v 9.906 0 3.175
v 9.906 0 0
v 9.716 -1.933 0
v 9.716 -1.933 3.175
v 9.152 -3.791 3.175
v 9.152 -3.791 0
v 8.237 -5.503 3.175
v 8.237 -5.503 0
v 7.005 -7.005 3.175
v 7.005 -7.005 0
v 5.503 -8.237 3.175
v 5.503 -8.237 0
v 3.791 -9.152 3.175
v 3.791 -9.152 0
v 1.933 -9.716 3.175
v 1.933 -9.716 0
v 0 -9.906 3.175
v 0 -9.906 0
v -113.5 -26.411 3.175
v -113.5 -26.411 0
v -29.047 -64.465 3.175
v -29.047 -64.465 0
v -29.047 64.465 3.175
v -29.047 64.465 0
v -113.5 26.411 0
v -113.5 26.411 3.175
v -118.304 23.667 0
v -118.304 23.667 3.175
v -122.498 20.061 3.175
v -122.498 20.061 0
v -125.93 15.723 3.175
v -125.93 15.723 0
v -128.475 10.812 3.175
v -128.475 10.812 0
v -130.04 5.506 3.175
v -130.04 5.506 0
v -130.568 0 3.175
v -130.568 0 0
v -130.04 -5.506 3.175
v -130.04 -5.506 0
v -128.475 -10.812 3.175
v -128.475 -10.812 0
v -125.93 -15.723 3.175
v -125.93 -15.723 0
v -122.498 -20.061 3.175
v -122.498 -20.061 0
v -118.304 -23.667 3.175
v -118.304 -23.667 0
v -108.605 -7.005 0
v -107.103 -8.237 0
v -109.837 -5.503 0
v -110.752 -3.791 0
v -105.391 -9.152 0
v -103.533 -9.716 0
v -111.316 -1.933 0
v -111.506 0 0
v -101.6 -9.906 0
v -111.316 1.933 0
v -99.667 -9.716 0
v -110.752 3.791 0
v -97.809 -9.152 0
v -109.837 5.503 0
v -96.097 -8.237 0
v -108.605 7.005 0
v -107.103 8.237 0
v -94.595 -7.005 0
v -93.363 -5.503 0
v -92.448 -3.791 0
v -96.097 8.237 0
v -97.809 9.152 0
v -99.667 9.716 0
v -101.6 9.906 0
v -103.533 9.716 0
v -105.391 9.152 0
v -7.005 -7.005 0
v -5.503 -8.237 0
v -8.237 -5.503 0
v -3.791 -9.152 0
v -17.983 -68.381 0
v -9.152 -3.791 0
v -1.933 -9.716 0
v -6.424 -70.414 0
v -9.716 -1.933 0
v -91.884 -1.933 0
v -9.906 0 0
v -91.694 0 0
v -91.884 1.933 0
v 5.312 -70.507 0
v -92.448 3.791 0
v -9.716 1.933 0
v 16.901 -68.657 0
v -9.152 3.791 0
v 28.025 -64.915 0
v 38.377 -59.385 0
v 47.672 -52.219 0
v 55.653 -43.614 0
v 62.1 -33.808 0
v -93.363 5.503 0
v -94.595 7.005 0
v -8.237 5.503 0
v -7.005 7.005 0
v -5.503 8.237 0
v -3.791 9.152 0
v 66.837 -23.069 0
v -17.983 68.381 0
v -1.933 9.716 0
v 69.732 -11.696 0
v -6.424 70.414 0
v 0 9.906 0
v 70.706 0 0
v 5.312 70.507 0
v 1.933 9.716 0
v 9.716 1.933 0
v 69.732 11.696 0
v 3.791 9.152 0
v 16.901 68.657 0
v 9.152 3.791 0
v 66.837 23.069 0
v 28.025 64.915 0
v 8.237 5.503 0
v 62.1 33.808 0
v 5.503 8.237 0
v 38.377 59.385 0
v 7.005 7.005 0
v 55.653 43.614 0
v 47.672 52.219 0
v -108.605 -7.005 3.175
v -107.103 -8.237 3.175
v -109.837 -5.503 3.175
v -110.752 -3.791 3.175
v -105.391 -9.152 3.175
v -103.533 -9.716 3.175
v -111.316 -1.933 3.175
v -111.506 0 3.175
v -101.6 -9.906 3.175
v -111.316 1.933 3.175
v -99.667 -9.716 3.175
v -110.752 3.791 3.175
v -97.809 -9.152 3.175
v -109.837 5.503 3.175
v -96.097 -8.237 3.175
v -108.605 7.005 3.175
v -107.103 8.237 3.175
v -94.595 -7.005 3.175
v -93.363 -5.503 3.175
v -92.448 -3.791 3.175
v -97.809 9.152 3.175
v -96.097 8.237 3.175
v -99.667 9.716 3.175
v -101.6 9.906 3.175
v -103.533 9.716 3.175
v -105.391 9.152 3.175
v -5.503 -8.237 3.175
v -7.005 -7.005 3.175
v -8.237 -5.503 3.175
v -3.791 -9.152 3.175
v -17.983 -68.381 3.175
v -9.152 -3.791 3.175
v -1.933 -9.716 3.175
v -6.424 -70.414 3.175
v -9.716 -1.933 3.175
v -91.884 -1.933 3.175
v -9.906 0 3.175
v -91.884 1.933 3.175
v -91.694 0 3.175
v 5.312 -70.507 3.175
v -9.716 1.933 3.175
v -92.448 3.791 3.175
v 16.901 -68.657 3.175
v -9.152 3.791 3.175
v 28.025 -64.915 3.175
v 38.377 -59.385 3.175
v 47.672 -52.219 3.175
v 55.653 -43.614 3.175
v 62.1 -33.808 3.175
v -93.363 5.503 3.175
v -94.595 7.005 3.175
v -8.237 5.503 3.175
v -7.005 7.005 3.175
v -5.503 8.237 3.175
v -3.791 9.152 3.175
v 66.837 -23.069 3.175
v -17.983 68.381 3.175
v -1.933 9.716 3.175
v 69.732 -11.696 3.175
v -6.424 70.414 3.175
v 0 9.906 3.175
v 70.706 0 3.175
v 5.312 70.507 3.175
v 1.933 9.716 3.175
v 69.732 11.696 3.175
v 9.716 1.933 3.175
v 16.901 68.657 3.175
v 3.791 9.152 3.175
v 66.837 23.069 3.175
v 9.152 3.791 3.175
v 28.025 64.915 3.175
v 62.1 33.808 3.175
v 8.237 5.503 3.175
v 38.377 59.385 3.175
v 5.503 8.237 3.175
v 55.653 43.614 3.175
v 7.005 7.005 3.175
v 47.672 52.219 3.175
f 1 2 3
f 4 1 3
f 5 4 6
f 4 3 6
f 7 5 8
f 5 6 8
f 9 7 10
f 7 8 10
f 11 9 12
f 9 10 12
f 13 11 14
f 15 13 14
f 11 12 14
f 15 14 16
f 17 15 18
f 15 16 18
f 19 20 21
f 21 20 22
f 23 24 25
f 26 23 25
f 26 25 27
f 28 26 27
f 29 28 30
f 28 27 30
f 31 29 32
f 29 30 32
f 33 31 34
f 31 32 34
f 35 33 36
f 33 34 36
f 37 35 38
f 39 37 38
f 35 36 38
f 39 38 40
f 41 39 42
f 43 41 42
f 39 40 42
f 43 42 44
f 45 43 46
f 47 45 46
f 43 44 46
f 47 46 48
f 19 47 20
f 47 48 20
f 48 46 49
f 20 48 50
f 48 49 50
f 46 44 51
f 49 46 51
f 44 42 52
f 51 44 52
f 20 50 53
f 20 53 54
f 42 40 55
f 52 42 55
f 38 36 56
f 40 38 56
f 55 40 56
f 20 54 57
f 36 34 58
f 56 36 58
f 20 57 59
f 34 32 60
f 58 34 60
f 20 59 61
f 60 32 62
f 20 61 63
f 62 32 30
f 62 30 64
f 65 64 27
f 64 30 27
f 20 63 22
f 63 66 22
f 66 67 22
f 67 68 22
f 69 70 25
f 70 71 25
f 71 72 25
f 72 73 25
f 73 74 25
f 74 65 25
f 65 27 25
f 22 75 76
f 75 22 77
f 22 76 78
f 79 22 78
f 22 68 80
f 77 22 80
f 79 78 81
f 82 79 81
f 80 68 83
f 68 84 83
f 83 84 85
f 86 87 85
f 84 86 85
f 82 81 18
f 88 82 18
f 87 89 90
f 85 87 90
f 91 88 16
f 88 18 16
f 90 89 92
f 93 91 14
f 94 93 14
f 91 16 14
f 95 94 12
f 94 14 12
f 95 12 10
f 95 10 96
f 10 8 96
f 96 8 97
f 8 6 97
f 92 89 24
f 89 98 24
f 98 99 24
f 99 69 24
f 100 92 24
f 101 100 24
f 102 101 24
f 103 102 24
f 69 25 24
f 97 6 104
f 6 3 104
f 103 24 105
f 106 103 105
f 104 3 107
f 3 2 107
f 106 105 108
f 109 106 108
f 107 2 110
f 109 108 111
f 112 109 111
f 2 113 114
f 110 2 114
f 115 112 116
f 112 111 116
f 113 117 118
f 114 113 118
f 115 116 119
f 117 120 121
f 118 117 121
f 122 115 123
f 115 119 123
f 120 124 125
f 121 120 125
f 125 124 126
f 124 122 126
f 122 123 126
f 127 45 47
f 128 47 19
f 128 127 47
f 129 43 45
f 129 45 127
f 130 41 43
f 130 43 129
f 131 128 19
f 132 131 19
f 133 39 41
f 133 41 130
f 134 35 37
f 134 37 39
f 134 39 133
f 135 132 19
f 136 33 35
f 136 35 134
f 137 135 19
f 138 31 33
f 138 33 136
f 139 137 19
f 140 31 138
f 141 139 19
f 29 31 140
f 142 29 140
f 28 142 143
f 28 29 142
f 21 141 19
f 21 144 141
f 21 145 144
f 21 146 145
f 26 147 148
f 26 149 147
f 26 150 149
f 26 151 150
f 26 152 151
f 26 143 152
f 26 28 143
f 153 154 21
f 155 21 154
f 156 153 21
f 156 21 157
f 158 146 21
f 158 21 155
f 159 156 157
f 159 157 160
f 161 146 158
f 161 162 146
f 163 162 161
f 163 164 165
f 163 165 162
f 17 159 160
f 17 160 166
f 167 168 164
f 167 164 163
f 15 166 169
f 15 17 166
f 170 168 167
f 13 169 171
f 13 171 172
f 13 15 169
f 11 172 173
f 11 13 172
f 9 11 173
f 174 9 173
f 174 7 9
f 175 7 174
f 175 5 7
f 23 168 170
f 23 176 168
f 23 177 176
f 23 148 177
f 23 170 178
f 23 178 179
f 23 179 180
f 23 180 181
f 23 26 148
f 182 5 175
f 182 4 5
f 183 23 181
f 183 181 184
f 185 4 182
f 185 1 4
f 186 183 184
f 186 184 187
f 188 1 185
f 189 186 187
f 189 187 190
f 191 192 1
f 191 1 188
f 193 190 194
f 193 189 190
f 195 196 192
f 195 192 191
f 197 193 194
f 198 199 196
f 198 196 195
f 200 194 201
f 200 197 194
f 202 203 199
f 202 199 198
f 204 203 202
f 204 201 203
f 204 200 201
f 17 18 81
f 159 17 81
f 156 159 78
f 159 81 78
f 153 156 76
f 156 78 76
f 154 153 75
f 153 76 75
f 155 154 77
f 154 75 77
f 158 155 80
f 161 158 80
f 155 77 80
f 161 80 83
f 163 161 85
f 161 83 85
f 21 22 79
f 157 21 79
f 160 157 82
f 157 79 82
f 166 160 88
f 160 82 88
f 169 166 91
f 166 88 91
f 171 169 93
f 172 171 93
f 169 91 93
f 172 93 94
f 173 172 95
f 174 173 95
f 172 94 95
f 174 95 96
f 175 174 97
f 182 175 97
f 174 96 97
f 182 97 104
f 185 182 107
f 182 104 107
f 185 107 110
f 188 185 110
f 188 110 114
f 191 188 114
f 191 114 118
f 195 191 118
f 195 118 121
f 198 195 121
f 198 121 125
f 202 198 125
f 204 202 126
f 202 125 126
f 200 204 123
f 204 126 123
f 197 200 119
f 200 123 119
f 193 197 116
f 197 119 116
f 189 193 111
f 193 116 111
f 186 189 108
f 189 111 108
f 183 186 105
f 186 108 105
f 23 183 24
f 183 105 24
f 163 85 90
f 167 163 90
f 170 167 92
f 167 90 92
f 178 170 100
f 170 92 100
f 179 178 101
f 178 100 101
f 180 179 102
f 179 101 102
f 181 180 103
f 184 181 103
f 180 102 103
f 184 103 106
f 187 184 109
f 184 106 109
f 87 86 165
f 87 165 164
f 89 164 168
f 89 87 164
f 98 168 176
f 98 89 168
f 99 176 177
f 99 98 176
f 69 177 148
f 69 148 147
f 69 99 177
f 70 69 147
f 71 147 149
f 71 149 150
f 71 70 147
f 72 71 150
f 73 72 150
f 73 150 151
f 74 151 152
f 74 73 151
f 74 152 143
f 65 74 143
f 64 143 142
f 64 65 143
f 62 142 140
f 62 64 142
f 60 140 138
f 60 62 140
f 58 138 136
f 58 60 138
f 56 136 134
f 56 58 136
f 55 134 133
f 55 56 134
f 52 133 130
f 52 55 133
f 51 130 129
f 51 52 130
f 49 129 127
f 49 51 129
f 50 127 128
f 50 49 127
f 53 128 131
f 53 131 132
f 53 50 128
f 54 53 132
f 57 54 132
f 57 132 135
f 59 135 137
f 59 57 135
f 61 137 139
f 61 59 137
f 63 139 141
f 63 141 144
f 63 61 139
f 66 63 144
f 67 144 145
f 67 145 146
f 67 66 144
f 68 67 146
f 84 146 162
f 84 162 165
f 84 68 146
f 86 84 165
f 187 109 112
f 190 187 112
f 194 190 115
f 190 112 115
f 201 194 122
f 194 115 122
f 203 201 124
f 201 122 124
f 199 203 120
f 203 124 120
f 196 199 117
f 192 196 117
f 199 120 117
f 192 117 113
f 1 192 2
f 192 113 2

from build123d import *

# Parameters (mm, degrees)
F0_R     = 13.9065
F0_R_2   = 9.906
F1_DEPTH = 3.175


# Not quite as in the source:
# - a length typed as a fraction of an inch, garbled in the dataset ("3 / 203.2 mm" for 3/8 in), is restored


with BuildPart() as f1:
    # F0 (on Top) → F1 (new body)
    with BuildSketch(Plane.XY):
        with BuildLine():
            Line((-29.0468705796, 64.4645603781), (-113.5004093806, 26.4109228888))
            ThreePointArc((-113.5004093806, 26.4109228888), (-130.5681996552, 0), (-113.5004093806, -26.4109228888))
            Line((-113.5004093806, -26.4109228888), (-29.0468705796, -64.4645603781))
            ThreePointArc((-29.0468705796, -64.4645603781), (70.706437014, 0), (-29.0468705796, 64.4645603781))
        make_face()
        with Locations((-101.6, 0)):
            Circle(F0_R, mode=Mode.SUBTRACT)
        with BuildLine():
            ThreePointArc((0, 64.77), (45.7993062175, 45.7993062175), (64.77, 0))
            ThreePointArc((64.77, 0), (45.7993062175, -45.7993062175), (0, -64.77))
            ThreePointArc((0, -64.77), (-45.7993062175, -45.7993062175), (-64.77, 0))
            ThreePointArc((-64.77, 0), (-45.7993062175, 45.7993062175), (0, 64.77))
        make_face(mode=Mode.SUBTRACT)
        with Locations((-101.6, 0)):
            Circle(F0_R)
        with Locations((-101.6, 0)):
            Circle(F0_R_2, mode=Mode.SUBTRACT)
        with BuildLine():
            Line((0, 9.906), (0, 64.77))
            ThreePointArc((0, 64.77), (-45.7993062175, 45.7993062175), (-64.77, 0))
            Line((-64.77, 0), (-9.906, 0))
            ThreePointArc((-9.906, 0), (-7.0045997744, 7.0045997744), (0, 9.906))
        make_face()
        with BuildLine():
            ThreePointArc((-64.77, 0), (-45.7993062175, -45.7993062175), (0, -64.77))
            Line((0, -64.77), (0, -9.906))
            ThreePointArc((0, -9.906), (-7.0045997744, -7.0045997744), (-9.906, 0))
            Line((-9.906, 0), (-64.77, 0))
        make_face()
        with BuildLine():
            ThreePointArc((0, -64.77), (45.7993062175, -45.7993062175), (64.77, 0))
            ThreePointArc((64.77, 0), (45.7993062175, 45.7993062175), (0, 64.77))
            Line((0, 64.77), (0, 9.906))
            ThreePointArc((0, 9.906), (7.0045997744, 7.0045997744), (9.906, 0))
            ThreePointArc((9.906, 0), (7.0045997744, -7.0045997744), (0, -9.906))
            Line((0, -9.906), (0, -64.77))
        make_face()
    extrude(amount=F1_DEPTH)


solid = f1.part
